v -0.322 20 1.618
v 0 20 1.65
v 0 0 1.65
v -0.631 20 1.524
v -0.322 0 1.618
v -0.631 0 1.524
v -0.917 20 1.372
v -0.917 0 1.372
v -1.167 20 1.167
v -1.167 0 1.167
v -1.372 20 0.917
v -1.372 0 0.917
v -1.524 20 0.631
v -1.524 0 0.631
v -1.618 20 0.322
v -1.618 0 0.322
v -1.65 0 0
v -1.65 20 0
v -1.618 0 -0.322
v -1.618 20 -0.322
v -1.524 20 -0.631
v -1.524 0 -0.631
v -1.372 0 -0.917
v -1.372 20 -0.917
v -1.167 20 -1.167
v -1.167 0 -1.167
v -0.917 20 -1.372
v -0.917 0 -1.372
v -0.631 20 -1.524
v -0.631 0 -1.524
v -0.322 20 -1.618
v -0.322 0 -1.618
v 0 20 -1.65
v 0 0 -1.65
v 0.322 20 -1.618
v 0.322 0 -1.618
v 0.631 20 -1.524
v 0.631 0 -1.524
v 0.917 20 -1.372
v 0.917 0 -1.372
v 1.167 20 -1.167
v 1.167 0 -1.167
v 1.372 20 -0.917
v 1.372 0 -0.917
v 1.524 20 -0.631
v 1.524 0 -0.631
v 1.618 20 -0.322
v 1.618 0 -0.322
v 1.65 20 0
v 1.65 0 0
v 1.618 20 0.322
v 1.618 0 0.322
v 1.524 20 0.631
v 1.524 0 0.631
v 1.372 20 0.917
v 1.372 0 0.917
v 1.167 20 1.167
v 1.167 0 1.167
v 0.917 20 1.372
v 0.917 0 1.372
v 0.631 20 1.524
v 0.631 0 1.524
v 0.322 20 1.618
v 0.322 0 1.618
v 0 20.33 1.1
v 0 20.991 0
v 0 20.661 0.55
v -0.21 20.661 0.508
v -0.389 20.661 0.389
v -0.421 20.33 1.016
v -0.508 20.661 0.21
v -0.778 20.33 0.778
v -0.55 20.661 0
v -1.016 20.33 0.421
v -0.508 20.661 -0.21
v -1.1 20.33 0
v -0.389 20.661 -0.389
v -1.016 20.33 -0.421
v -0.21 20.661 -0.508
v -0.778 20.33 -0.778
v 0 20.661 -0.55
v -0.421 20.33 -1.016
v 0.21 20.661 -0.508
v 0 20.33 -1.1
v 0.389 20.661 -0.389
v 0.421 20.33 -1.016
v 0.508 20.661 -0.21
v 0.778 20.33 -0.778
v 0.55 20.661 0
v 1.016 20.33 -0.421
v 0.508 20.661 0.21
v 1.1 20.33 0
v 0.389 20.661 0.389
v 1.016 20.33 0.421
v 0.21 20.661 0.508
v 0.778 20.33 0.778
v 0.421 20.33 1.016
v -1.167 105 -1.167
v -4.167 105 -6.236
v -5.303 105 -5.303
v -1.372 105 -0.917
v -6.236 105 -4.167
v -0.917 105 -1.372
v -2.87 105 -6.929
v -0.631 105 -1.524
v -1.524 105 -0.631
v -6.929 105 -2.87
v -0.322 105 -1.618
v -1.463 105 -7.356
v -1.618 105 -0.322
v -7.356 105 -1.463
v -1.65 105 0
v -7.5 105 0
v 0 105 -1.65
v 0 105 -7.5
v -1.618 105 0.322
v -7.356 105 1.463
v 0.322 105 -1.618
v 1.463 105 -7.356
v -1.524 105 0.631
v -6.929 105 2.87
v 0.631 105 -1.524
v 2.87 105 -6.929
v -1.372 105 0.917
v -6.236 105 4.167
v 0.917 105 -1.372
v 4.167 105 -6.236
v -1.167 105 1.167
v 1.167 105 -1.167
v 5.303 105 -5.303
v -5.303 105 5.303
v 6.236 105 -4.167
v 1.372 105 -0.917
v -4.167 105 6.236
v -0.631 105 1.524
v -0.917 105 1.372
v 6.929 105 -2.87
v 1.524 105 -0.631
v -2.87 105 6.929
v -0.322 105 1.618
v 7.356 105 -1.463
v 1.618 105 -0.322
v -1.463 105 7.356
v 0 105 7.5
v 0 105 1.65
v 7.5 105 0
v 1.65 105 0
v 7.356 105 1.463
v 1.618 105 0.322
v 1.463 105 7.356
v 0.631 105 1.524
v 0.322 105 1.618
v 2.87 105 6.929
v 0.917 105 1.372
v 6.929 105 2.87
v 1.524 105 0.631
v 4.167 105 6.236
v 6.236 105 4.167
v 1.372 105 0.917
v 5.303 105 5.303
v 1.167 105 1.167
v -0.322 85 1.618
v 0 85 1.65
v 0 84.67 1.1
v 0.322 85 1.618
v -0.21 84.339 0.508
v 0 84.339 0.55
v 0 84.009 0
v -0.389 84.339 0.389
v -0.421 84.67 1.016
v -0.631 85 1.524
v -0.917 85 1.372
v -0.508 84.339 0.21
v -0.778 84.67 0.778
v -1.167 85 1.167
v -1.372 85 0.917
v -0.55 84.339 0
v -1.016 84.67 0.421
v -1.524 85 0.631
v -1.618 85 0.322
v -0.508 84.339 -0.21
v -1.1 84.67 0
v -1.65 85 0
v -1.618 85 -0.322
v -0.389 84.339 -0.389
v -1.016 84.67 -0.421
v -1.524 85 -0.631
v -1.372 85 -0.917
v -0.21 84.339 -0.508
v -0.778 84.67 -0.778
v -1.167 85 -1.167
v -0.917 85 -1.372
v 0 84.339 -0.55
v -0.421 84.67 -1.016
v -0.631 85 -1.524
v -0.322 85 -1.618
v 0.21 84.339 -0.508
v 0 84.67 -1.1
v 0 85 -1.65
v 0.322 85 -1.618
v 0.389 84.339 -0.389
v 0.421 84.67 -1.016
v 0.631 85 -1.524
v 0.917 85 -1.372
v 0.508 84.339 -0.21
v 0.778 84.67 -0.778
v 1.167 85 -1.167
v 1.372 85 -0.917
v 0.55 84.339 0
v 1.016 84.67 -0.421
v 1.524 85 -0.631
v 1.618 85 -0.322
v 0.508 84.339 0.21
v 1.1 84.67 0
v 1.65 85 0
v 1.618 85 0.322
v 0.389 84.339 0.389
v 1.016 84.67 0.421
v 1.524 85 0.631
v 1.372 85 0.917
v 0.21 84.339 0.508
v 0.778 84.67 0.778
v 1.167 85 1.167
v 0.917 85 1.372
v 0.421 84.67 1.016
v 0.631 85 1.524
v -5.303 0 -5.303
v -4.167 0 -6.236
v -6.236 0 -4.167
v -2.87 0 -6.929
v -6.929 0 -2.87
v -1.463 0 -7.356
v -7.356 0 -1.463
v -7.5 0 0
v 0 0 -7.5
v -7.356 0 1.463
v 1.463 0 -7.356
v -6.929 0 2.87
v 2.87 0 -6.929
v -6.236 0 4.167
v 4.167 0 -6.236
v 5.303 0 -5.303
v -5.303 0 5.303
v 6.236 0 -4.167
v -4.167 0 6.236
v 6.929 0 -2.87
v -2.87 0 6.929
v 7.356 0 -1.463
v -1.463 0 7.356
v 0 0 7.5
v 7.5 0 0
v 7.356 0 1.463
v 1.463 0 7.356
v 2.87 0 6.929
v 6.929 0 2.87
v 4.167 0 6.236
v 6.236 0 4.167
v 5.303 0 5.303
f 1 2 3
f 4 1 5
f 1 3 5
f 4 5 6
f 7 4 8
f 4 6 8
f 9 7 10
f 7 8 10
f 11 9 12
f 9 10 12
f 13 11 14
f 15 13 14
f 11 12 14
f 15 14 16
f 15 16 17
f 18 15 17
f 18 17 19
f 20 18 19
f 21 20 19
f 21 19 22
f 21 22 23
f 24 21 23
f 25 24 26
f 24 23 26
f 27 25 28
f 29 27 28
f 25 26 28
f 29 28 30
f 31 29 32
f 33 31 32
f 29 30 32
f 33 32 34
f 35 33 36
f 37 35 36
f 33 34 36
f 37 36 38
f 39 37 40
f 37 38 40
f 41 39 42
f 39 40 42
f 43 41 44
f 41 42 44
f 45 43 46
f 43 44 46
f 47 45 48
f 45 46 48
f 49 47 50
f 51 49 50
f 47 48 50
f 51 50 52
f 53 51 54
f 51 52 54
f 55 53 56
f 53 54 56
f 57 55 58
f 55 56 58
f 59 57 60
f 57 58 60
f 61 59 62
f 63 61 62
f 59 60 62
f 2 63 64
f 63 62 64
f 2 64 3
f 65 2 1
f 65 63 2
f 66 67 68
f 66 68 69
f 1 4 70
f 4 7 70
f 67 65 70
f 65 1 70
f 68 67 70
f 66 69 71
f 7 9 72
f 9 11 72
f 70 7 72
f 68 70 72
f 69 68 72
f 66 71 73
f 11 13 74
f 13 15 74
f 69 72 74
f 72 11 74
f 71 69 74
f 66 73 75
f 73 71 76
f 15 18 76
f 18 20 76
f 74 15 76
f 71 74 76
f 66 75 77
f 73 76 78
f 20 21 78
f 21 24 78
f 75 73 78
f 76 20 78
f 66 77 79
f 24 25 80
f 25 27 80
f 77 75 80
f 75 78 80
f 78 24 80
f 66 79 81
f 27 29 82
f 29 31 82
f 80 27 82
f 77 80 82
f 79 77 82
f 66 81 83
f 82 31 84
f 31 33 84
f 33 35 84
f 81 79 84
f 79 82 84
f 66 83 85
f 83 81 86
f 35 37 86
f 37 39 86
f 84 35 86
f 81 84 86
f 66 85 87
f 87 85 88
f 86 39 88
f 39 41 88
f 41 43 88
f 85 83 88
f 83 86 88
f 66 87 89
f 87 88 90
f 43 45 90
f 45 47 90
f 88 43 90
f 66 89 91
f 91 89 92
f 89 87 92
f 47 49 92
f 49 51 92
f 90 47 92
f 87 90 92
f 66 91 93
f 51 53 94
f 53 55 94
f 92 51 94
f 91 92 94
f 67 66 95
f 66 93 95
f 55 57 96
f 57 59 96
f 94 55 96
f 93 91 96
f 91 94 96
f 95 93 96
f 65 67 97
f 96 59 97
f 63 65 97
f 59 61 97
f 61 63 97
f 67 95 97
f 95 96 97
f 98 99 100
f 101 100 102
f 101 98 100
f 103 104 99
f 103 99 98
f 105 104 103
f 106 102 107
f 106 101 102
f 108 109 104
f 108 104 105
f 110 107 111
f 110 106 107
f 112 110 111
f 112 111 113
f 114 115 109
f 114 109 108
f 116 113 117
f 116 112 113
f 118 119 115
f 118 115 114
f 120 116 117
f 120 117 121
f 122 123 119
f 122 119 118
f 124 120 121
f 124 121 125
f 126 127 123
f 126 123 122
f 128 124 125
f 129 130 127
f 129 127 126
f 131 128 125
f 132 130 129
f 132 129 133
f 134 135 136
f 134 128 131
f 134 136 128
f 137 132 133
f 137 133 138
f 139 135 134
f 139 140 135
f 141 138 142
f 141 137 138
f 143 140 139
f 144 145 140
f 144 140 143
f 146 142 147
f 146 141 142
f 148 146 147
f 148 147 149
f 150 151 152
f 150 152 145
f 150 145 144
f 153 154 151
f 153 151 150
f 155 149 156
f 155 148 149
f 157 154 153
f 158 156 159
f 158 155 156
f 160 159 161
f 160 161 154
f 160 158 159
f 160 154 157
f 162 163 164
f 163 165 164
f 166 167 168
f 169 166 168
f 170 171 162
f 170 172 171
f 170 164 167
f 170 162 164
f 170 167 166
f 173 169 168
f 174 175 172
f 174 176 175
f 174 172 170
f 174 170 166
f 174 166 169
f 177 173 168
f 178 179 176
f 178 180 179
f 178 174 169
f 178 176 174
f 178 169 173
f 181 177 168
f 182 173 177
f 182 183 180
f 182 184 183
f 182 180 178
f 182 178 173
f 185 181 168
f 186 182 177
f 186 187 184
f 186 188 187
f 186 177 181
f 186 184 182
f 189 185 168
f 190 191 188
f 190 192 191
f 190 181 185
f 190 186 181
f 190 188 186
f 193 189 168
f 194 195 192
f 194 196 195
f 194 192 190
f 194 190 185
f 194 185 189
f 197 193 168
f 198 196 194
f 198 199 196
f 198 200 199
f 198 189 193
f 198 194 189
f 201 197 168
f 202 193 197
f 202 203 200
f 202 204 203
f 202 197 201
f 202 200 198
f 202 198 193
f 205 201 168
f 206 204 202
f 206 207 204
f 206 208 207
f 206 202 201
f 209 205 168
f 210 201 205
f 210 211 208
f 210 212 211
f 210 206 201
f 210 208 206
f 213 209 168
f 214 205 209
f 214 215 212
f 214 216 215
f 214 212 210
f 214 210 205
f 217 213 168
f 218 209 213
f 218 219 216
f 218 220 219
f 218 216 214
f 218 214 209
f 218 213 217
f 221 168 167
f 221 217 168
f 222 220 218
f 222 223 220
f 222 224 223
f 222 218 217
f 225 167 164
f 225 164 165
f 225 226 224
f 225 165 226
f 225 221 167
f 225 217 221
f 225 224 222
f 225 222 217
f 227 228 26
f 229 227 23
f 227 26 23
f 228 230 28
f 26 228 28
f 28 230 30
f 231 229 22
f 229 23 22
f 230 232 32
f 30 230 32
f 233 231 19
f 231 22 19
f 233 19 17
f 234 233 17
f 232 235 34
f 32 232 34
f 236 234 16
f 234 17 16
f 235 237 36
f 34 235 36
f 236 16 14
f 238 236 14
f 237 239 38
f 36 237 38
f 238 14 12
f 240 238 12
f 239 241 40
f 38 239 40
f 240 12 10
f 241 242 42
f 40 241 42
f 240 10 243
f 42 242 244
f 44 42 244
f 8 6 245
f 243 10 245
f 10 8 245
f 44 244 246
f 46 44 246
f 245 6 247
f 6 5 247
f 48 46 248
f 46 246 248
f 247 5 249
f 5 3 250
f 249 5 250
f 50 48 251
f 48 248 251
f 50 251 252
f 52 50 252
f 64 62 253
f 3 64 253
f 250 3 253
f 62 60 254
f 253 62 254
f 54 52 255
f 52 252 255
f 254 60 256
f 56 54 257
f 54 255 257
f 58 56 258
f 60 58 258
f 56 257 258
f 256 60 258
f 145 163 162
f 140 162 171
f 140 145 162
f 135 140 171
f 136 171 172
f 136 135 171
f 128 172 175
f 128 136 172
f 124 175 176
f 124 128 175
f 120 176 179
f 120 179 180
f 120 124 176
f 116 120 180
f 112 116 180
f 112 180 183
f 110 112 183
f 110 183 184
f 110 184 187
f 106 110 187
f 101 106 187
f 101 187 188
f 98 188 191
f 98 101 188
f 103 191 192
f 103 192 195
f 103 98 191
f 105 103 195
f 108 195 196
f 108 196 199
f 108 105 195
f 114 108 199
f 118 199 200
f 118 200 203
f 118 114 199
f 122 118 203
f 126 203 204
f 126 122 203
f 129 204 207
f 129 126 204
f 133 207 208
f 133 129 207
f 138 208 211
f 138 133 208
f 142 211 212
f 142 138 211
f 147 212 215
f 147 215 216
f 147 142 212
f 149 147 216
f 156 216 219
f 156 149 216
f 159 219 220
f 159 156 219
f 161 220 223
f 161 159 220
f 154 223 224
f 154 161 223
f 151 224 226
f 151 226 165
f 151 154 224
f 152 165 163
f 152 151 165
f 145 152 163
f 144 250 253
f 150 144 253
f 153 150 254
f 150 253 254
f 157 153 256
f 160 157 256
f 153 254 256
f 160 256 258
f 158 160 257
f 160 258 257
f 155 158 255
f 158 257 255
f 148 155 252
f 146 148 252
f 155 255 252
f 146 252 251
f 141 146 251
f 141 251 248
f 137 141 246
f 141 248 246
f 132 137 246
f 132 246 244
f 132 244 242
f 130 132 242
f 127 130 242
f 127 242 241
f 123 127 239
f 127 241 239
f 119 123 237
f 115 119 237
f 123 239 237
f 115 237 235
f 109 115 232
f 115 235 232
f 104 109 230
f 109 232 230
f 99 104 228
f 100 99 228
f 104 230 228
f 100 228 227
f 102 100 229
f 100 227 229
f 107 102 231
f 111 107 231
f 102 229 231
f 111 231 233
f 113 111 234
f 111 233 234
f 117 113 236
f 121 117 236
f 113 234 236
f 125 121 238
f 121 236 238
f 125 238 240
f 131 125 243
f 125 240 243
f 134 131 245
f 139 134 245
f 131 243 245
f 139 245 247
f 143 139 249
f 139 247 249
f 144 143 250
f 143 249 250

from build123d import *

# Parameters (mm, degrees)
SKETCH_1_R      = 7.5
EXTRUDE_1_DEPTH = 105


with BuildPart() as part:
    # ｽｹｯﾁ1 → ﾎﾞｽ - 押し出し1 (new body)
    with BuildSketch(Plane(origin=(0, 0, 0), x_dir=(1, 0, 0), z_dir=(0, 1, 0))):
        with Locations(Location((0, 0, 0), (0, 0, 270))):
            Circle(SKETCH_1_R)
    extrude(amount=EXTRUDE_1_DEPTH)

    # ｽｹｯﾁ3 → M4x0.7 ねじ穴1 (revolve, cut)
    with BuildSketch(Plane(origin=(0, 105, 0), x_dir=(0, 0, 1), z_dir=(1, 0, 0))):
        Polygon((0, 0), (0, 20.991420021), (1.65, 20), (1.65, 0), align=None)
    m4x0_7_1 = revolve(axis=Axis((0, 111.35, 0), (0, -1, 0)), mode=Mode.SUBTRACT)

    # ﾐﾗｰ1: M4x0.7 ねじ穴1 across plane
    add(m4x0_7_1.mirror(Plane.ZX.offset(52.5)), mode=Mode.SUBTRACT)


solid = part.part
